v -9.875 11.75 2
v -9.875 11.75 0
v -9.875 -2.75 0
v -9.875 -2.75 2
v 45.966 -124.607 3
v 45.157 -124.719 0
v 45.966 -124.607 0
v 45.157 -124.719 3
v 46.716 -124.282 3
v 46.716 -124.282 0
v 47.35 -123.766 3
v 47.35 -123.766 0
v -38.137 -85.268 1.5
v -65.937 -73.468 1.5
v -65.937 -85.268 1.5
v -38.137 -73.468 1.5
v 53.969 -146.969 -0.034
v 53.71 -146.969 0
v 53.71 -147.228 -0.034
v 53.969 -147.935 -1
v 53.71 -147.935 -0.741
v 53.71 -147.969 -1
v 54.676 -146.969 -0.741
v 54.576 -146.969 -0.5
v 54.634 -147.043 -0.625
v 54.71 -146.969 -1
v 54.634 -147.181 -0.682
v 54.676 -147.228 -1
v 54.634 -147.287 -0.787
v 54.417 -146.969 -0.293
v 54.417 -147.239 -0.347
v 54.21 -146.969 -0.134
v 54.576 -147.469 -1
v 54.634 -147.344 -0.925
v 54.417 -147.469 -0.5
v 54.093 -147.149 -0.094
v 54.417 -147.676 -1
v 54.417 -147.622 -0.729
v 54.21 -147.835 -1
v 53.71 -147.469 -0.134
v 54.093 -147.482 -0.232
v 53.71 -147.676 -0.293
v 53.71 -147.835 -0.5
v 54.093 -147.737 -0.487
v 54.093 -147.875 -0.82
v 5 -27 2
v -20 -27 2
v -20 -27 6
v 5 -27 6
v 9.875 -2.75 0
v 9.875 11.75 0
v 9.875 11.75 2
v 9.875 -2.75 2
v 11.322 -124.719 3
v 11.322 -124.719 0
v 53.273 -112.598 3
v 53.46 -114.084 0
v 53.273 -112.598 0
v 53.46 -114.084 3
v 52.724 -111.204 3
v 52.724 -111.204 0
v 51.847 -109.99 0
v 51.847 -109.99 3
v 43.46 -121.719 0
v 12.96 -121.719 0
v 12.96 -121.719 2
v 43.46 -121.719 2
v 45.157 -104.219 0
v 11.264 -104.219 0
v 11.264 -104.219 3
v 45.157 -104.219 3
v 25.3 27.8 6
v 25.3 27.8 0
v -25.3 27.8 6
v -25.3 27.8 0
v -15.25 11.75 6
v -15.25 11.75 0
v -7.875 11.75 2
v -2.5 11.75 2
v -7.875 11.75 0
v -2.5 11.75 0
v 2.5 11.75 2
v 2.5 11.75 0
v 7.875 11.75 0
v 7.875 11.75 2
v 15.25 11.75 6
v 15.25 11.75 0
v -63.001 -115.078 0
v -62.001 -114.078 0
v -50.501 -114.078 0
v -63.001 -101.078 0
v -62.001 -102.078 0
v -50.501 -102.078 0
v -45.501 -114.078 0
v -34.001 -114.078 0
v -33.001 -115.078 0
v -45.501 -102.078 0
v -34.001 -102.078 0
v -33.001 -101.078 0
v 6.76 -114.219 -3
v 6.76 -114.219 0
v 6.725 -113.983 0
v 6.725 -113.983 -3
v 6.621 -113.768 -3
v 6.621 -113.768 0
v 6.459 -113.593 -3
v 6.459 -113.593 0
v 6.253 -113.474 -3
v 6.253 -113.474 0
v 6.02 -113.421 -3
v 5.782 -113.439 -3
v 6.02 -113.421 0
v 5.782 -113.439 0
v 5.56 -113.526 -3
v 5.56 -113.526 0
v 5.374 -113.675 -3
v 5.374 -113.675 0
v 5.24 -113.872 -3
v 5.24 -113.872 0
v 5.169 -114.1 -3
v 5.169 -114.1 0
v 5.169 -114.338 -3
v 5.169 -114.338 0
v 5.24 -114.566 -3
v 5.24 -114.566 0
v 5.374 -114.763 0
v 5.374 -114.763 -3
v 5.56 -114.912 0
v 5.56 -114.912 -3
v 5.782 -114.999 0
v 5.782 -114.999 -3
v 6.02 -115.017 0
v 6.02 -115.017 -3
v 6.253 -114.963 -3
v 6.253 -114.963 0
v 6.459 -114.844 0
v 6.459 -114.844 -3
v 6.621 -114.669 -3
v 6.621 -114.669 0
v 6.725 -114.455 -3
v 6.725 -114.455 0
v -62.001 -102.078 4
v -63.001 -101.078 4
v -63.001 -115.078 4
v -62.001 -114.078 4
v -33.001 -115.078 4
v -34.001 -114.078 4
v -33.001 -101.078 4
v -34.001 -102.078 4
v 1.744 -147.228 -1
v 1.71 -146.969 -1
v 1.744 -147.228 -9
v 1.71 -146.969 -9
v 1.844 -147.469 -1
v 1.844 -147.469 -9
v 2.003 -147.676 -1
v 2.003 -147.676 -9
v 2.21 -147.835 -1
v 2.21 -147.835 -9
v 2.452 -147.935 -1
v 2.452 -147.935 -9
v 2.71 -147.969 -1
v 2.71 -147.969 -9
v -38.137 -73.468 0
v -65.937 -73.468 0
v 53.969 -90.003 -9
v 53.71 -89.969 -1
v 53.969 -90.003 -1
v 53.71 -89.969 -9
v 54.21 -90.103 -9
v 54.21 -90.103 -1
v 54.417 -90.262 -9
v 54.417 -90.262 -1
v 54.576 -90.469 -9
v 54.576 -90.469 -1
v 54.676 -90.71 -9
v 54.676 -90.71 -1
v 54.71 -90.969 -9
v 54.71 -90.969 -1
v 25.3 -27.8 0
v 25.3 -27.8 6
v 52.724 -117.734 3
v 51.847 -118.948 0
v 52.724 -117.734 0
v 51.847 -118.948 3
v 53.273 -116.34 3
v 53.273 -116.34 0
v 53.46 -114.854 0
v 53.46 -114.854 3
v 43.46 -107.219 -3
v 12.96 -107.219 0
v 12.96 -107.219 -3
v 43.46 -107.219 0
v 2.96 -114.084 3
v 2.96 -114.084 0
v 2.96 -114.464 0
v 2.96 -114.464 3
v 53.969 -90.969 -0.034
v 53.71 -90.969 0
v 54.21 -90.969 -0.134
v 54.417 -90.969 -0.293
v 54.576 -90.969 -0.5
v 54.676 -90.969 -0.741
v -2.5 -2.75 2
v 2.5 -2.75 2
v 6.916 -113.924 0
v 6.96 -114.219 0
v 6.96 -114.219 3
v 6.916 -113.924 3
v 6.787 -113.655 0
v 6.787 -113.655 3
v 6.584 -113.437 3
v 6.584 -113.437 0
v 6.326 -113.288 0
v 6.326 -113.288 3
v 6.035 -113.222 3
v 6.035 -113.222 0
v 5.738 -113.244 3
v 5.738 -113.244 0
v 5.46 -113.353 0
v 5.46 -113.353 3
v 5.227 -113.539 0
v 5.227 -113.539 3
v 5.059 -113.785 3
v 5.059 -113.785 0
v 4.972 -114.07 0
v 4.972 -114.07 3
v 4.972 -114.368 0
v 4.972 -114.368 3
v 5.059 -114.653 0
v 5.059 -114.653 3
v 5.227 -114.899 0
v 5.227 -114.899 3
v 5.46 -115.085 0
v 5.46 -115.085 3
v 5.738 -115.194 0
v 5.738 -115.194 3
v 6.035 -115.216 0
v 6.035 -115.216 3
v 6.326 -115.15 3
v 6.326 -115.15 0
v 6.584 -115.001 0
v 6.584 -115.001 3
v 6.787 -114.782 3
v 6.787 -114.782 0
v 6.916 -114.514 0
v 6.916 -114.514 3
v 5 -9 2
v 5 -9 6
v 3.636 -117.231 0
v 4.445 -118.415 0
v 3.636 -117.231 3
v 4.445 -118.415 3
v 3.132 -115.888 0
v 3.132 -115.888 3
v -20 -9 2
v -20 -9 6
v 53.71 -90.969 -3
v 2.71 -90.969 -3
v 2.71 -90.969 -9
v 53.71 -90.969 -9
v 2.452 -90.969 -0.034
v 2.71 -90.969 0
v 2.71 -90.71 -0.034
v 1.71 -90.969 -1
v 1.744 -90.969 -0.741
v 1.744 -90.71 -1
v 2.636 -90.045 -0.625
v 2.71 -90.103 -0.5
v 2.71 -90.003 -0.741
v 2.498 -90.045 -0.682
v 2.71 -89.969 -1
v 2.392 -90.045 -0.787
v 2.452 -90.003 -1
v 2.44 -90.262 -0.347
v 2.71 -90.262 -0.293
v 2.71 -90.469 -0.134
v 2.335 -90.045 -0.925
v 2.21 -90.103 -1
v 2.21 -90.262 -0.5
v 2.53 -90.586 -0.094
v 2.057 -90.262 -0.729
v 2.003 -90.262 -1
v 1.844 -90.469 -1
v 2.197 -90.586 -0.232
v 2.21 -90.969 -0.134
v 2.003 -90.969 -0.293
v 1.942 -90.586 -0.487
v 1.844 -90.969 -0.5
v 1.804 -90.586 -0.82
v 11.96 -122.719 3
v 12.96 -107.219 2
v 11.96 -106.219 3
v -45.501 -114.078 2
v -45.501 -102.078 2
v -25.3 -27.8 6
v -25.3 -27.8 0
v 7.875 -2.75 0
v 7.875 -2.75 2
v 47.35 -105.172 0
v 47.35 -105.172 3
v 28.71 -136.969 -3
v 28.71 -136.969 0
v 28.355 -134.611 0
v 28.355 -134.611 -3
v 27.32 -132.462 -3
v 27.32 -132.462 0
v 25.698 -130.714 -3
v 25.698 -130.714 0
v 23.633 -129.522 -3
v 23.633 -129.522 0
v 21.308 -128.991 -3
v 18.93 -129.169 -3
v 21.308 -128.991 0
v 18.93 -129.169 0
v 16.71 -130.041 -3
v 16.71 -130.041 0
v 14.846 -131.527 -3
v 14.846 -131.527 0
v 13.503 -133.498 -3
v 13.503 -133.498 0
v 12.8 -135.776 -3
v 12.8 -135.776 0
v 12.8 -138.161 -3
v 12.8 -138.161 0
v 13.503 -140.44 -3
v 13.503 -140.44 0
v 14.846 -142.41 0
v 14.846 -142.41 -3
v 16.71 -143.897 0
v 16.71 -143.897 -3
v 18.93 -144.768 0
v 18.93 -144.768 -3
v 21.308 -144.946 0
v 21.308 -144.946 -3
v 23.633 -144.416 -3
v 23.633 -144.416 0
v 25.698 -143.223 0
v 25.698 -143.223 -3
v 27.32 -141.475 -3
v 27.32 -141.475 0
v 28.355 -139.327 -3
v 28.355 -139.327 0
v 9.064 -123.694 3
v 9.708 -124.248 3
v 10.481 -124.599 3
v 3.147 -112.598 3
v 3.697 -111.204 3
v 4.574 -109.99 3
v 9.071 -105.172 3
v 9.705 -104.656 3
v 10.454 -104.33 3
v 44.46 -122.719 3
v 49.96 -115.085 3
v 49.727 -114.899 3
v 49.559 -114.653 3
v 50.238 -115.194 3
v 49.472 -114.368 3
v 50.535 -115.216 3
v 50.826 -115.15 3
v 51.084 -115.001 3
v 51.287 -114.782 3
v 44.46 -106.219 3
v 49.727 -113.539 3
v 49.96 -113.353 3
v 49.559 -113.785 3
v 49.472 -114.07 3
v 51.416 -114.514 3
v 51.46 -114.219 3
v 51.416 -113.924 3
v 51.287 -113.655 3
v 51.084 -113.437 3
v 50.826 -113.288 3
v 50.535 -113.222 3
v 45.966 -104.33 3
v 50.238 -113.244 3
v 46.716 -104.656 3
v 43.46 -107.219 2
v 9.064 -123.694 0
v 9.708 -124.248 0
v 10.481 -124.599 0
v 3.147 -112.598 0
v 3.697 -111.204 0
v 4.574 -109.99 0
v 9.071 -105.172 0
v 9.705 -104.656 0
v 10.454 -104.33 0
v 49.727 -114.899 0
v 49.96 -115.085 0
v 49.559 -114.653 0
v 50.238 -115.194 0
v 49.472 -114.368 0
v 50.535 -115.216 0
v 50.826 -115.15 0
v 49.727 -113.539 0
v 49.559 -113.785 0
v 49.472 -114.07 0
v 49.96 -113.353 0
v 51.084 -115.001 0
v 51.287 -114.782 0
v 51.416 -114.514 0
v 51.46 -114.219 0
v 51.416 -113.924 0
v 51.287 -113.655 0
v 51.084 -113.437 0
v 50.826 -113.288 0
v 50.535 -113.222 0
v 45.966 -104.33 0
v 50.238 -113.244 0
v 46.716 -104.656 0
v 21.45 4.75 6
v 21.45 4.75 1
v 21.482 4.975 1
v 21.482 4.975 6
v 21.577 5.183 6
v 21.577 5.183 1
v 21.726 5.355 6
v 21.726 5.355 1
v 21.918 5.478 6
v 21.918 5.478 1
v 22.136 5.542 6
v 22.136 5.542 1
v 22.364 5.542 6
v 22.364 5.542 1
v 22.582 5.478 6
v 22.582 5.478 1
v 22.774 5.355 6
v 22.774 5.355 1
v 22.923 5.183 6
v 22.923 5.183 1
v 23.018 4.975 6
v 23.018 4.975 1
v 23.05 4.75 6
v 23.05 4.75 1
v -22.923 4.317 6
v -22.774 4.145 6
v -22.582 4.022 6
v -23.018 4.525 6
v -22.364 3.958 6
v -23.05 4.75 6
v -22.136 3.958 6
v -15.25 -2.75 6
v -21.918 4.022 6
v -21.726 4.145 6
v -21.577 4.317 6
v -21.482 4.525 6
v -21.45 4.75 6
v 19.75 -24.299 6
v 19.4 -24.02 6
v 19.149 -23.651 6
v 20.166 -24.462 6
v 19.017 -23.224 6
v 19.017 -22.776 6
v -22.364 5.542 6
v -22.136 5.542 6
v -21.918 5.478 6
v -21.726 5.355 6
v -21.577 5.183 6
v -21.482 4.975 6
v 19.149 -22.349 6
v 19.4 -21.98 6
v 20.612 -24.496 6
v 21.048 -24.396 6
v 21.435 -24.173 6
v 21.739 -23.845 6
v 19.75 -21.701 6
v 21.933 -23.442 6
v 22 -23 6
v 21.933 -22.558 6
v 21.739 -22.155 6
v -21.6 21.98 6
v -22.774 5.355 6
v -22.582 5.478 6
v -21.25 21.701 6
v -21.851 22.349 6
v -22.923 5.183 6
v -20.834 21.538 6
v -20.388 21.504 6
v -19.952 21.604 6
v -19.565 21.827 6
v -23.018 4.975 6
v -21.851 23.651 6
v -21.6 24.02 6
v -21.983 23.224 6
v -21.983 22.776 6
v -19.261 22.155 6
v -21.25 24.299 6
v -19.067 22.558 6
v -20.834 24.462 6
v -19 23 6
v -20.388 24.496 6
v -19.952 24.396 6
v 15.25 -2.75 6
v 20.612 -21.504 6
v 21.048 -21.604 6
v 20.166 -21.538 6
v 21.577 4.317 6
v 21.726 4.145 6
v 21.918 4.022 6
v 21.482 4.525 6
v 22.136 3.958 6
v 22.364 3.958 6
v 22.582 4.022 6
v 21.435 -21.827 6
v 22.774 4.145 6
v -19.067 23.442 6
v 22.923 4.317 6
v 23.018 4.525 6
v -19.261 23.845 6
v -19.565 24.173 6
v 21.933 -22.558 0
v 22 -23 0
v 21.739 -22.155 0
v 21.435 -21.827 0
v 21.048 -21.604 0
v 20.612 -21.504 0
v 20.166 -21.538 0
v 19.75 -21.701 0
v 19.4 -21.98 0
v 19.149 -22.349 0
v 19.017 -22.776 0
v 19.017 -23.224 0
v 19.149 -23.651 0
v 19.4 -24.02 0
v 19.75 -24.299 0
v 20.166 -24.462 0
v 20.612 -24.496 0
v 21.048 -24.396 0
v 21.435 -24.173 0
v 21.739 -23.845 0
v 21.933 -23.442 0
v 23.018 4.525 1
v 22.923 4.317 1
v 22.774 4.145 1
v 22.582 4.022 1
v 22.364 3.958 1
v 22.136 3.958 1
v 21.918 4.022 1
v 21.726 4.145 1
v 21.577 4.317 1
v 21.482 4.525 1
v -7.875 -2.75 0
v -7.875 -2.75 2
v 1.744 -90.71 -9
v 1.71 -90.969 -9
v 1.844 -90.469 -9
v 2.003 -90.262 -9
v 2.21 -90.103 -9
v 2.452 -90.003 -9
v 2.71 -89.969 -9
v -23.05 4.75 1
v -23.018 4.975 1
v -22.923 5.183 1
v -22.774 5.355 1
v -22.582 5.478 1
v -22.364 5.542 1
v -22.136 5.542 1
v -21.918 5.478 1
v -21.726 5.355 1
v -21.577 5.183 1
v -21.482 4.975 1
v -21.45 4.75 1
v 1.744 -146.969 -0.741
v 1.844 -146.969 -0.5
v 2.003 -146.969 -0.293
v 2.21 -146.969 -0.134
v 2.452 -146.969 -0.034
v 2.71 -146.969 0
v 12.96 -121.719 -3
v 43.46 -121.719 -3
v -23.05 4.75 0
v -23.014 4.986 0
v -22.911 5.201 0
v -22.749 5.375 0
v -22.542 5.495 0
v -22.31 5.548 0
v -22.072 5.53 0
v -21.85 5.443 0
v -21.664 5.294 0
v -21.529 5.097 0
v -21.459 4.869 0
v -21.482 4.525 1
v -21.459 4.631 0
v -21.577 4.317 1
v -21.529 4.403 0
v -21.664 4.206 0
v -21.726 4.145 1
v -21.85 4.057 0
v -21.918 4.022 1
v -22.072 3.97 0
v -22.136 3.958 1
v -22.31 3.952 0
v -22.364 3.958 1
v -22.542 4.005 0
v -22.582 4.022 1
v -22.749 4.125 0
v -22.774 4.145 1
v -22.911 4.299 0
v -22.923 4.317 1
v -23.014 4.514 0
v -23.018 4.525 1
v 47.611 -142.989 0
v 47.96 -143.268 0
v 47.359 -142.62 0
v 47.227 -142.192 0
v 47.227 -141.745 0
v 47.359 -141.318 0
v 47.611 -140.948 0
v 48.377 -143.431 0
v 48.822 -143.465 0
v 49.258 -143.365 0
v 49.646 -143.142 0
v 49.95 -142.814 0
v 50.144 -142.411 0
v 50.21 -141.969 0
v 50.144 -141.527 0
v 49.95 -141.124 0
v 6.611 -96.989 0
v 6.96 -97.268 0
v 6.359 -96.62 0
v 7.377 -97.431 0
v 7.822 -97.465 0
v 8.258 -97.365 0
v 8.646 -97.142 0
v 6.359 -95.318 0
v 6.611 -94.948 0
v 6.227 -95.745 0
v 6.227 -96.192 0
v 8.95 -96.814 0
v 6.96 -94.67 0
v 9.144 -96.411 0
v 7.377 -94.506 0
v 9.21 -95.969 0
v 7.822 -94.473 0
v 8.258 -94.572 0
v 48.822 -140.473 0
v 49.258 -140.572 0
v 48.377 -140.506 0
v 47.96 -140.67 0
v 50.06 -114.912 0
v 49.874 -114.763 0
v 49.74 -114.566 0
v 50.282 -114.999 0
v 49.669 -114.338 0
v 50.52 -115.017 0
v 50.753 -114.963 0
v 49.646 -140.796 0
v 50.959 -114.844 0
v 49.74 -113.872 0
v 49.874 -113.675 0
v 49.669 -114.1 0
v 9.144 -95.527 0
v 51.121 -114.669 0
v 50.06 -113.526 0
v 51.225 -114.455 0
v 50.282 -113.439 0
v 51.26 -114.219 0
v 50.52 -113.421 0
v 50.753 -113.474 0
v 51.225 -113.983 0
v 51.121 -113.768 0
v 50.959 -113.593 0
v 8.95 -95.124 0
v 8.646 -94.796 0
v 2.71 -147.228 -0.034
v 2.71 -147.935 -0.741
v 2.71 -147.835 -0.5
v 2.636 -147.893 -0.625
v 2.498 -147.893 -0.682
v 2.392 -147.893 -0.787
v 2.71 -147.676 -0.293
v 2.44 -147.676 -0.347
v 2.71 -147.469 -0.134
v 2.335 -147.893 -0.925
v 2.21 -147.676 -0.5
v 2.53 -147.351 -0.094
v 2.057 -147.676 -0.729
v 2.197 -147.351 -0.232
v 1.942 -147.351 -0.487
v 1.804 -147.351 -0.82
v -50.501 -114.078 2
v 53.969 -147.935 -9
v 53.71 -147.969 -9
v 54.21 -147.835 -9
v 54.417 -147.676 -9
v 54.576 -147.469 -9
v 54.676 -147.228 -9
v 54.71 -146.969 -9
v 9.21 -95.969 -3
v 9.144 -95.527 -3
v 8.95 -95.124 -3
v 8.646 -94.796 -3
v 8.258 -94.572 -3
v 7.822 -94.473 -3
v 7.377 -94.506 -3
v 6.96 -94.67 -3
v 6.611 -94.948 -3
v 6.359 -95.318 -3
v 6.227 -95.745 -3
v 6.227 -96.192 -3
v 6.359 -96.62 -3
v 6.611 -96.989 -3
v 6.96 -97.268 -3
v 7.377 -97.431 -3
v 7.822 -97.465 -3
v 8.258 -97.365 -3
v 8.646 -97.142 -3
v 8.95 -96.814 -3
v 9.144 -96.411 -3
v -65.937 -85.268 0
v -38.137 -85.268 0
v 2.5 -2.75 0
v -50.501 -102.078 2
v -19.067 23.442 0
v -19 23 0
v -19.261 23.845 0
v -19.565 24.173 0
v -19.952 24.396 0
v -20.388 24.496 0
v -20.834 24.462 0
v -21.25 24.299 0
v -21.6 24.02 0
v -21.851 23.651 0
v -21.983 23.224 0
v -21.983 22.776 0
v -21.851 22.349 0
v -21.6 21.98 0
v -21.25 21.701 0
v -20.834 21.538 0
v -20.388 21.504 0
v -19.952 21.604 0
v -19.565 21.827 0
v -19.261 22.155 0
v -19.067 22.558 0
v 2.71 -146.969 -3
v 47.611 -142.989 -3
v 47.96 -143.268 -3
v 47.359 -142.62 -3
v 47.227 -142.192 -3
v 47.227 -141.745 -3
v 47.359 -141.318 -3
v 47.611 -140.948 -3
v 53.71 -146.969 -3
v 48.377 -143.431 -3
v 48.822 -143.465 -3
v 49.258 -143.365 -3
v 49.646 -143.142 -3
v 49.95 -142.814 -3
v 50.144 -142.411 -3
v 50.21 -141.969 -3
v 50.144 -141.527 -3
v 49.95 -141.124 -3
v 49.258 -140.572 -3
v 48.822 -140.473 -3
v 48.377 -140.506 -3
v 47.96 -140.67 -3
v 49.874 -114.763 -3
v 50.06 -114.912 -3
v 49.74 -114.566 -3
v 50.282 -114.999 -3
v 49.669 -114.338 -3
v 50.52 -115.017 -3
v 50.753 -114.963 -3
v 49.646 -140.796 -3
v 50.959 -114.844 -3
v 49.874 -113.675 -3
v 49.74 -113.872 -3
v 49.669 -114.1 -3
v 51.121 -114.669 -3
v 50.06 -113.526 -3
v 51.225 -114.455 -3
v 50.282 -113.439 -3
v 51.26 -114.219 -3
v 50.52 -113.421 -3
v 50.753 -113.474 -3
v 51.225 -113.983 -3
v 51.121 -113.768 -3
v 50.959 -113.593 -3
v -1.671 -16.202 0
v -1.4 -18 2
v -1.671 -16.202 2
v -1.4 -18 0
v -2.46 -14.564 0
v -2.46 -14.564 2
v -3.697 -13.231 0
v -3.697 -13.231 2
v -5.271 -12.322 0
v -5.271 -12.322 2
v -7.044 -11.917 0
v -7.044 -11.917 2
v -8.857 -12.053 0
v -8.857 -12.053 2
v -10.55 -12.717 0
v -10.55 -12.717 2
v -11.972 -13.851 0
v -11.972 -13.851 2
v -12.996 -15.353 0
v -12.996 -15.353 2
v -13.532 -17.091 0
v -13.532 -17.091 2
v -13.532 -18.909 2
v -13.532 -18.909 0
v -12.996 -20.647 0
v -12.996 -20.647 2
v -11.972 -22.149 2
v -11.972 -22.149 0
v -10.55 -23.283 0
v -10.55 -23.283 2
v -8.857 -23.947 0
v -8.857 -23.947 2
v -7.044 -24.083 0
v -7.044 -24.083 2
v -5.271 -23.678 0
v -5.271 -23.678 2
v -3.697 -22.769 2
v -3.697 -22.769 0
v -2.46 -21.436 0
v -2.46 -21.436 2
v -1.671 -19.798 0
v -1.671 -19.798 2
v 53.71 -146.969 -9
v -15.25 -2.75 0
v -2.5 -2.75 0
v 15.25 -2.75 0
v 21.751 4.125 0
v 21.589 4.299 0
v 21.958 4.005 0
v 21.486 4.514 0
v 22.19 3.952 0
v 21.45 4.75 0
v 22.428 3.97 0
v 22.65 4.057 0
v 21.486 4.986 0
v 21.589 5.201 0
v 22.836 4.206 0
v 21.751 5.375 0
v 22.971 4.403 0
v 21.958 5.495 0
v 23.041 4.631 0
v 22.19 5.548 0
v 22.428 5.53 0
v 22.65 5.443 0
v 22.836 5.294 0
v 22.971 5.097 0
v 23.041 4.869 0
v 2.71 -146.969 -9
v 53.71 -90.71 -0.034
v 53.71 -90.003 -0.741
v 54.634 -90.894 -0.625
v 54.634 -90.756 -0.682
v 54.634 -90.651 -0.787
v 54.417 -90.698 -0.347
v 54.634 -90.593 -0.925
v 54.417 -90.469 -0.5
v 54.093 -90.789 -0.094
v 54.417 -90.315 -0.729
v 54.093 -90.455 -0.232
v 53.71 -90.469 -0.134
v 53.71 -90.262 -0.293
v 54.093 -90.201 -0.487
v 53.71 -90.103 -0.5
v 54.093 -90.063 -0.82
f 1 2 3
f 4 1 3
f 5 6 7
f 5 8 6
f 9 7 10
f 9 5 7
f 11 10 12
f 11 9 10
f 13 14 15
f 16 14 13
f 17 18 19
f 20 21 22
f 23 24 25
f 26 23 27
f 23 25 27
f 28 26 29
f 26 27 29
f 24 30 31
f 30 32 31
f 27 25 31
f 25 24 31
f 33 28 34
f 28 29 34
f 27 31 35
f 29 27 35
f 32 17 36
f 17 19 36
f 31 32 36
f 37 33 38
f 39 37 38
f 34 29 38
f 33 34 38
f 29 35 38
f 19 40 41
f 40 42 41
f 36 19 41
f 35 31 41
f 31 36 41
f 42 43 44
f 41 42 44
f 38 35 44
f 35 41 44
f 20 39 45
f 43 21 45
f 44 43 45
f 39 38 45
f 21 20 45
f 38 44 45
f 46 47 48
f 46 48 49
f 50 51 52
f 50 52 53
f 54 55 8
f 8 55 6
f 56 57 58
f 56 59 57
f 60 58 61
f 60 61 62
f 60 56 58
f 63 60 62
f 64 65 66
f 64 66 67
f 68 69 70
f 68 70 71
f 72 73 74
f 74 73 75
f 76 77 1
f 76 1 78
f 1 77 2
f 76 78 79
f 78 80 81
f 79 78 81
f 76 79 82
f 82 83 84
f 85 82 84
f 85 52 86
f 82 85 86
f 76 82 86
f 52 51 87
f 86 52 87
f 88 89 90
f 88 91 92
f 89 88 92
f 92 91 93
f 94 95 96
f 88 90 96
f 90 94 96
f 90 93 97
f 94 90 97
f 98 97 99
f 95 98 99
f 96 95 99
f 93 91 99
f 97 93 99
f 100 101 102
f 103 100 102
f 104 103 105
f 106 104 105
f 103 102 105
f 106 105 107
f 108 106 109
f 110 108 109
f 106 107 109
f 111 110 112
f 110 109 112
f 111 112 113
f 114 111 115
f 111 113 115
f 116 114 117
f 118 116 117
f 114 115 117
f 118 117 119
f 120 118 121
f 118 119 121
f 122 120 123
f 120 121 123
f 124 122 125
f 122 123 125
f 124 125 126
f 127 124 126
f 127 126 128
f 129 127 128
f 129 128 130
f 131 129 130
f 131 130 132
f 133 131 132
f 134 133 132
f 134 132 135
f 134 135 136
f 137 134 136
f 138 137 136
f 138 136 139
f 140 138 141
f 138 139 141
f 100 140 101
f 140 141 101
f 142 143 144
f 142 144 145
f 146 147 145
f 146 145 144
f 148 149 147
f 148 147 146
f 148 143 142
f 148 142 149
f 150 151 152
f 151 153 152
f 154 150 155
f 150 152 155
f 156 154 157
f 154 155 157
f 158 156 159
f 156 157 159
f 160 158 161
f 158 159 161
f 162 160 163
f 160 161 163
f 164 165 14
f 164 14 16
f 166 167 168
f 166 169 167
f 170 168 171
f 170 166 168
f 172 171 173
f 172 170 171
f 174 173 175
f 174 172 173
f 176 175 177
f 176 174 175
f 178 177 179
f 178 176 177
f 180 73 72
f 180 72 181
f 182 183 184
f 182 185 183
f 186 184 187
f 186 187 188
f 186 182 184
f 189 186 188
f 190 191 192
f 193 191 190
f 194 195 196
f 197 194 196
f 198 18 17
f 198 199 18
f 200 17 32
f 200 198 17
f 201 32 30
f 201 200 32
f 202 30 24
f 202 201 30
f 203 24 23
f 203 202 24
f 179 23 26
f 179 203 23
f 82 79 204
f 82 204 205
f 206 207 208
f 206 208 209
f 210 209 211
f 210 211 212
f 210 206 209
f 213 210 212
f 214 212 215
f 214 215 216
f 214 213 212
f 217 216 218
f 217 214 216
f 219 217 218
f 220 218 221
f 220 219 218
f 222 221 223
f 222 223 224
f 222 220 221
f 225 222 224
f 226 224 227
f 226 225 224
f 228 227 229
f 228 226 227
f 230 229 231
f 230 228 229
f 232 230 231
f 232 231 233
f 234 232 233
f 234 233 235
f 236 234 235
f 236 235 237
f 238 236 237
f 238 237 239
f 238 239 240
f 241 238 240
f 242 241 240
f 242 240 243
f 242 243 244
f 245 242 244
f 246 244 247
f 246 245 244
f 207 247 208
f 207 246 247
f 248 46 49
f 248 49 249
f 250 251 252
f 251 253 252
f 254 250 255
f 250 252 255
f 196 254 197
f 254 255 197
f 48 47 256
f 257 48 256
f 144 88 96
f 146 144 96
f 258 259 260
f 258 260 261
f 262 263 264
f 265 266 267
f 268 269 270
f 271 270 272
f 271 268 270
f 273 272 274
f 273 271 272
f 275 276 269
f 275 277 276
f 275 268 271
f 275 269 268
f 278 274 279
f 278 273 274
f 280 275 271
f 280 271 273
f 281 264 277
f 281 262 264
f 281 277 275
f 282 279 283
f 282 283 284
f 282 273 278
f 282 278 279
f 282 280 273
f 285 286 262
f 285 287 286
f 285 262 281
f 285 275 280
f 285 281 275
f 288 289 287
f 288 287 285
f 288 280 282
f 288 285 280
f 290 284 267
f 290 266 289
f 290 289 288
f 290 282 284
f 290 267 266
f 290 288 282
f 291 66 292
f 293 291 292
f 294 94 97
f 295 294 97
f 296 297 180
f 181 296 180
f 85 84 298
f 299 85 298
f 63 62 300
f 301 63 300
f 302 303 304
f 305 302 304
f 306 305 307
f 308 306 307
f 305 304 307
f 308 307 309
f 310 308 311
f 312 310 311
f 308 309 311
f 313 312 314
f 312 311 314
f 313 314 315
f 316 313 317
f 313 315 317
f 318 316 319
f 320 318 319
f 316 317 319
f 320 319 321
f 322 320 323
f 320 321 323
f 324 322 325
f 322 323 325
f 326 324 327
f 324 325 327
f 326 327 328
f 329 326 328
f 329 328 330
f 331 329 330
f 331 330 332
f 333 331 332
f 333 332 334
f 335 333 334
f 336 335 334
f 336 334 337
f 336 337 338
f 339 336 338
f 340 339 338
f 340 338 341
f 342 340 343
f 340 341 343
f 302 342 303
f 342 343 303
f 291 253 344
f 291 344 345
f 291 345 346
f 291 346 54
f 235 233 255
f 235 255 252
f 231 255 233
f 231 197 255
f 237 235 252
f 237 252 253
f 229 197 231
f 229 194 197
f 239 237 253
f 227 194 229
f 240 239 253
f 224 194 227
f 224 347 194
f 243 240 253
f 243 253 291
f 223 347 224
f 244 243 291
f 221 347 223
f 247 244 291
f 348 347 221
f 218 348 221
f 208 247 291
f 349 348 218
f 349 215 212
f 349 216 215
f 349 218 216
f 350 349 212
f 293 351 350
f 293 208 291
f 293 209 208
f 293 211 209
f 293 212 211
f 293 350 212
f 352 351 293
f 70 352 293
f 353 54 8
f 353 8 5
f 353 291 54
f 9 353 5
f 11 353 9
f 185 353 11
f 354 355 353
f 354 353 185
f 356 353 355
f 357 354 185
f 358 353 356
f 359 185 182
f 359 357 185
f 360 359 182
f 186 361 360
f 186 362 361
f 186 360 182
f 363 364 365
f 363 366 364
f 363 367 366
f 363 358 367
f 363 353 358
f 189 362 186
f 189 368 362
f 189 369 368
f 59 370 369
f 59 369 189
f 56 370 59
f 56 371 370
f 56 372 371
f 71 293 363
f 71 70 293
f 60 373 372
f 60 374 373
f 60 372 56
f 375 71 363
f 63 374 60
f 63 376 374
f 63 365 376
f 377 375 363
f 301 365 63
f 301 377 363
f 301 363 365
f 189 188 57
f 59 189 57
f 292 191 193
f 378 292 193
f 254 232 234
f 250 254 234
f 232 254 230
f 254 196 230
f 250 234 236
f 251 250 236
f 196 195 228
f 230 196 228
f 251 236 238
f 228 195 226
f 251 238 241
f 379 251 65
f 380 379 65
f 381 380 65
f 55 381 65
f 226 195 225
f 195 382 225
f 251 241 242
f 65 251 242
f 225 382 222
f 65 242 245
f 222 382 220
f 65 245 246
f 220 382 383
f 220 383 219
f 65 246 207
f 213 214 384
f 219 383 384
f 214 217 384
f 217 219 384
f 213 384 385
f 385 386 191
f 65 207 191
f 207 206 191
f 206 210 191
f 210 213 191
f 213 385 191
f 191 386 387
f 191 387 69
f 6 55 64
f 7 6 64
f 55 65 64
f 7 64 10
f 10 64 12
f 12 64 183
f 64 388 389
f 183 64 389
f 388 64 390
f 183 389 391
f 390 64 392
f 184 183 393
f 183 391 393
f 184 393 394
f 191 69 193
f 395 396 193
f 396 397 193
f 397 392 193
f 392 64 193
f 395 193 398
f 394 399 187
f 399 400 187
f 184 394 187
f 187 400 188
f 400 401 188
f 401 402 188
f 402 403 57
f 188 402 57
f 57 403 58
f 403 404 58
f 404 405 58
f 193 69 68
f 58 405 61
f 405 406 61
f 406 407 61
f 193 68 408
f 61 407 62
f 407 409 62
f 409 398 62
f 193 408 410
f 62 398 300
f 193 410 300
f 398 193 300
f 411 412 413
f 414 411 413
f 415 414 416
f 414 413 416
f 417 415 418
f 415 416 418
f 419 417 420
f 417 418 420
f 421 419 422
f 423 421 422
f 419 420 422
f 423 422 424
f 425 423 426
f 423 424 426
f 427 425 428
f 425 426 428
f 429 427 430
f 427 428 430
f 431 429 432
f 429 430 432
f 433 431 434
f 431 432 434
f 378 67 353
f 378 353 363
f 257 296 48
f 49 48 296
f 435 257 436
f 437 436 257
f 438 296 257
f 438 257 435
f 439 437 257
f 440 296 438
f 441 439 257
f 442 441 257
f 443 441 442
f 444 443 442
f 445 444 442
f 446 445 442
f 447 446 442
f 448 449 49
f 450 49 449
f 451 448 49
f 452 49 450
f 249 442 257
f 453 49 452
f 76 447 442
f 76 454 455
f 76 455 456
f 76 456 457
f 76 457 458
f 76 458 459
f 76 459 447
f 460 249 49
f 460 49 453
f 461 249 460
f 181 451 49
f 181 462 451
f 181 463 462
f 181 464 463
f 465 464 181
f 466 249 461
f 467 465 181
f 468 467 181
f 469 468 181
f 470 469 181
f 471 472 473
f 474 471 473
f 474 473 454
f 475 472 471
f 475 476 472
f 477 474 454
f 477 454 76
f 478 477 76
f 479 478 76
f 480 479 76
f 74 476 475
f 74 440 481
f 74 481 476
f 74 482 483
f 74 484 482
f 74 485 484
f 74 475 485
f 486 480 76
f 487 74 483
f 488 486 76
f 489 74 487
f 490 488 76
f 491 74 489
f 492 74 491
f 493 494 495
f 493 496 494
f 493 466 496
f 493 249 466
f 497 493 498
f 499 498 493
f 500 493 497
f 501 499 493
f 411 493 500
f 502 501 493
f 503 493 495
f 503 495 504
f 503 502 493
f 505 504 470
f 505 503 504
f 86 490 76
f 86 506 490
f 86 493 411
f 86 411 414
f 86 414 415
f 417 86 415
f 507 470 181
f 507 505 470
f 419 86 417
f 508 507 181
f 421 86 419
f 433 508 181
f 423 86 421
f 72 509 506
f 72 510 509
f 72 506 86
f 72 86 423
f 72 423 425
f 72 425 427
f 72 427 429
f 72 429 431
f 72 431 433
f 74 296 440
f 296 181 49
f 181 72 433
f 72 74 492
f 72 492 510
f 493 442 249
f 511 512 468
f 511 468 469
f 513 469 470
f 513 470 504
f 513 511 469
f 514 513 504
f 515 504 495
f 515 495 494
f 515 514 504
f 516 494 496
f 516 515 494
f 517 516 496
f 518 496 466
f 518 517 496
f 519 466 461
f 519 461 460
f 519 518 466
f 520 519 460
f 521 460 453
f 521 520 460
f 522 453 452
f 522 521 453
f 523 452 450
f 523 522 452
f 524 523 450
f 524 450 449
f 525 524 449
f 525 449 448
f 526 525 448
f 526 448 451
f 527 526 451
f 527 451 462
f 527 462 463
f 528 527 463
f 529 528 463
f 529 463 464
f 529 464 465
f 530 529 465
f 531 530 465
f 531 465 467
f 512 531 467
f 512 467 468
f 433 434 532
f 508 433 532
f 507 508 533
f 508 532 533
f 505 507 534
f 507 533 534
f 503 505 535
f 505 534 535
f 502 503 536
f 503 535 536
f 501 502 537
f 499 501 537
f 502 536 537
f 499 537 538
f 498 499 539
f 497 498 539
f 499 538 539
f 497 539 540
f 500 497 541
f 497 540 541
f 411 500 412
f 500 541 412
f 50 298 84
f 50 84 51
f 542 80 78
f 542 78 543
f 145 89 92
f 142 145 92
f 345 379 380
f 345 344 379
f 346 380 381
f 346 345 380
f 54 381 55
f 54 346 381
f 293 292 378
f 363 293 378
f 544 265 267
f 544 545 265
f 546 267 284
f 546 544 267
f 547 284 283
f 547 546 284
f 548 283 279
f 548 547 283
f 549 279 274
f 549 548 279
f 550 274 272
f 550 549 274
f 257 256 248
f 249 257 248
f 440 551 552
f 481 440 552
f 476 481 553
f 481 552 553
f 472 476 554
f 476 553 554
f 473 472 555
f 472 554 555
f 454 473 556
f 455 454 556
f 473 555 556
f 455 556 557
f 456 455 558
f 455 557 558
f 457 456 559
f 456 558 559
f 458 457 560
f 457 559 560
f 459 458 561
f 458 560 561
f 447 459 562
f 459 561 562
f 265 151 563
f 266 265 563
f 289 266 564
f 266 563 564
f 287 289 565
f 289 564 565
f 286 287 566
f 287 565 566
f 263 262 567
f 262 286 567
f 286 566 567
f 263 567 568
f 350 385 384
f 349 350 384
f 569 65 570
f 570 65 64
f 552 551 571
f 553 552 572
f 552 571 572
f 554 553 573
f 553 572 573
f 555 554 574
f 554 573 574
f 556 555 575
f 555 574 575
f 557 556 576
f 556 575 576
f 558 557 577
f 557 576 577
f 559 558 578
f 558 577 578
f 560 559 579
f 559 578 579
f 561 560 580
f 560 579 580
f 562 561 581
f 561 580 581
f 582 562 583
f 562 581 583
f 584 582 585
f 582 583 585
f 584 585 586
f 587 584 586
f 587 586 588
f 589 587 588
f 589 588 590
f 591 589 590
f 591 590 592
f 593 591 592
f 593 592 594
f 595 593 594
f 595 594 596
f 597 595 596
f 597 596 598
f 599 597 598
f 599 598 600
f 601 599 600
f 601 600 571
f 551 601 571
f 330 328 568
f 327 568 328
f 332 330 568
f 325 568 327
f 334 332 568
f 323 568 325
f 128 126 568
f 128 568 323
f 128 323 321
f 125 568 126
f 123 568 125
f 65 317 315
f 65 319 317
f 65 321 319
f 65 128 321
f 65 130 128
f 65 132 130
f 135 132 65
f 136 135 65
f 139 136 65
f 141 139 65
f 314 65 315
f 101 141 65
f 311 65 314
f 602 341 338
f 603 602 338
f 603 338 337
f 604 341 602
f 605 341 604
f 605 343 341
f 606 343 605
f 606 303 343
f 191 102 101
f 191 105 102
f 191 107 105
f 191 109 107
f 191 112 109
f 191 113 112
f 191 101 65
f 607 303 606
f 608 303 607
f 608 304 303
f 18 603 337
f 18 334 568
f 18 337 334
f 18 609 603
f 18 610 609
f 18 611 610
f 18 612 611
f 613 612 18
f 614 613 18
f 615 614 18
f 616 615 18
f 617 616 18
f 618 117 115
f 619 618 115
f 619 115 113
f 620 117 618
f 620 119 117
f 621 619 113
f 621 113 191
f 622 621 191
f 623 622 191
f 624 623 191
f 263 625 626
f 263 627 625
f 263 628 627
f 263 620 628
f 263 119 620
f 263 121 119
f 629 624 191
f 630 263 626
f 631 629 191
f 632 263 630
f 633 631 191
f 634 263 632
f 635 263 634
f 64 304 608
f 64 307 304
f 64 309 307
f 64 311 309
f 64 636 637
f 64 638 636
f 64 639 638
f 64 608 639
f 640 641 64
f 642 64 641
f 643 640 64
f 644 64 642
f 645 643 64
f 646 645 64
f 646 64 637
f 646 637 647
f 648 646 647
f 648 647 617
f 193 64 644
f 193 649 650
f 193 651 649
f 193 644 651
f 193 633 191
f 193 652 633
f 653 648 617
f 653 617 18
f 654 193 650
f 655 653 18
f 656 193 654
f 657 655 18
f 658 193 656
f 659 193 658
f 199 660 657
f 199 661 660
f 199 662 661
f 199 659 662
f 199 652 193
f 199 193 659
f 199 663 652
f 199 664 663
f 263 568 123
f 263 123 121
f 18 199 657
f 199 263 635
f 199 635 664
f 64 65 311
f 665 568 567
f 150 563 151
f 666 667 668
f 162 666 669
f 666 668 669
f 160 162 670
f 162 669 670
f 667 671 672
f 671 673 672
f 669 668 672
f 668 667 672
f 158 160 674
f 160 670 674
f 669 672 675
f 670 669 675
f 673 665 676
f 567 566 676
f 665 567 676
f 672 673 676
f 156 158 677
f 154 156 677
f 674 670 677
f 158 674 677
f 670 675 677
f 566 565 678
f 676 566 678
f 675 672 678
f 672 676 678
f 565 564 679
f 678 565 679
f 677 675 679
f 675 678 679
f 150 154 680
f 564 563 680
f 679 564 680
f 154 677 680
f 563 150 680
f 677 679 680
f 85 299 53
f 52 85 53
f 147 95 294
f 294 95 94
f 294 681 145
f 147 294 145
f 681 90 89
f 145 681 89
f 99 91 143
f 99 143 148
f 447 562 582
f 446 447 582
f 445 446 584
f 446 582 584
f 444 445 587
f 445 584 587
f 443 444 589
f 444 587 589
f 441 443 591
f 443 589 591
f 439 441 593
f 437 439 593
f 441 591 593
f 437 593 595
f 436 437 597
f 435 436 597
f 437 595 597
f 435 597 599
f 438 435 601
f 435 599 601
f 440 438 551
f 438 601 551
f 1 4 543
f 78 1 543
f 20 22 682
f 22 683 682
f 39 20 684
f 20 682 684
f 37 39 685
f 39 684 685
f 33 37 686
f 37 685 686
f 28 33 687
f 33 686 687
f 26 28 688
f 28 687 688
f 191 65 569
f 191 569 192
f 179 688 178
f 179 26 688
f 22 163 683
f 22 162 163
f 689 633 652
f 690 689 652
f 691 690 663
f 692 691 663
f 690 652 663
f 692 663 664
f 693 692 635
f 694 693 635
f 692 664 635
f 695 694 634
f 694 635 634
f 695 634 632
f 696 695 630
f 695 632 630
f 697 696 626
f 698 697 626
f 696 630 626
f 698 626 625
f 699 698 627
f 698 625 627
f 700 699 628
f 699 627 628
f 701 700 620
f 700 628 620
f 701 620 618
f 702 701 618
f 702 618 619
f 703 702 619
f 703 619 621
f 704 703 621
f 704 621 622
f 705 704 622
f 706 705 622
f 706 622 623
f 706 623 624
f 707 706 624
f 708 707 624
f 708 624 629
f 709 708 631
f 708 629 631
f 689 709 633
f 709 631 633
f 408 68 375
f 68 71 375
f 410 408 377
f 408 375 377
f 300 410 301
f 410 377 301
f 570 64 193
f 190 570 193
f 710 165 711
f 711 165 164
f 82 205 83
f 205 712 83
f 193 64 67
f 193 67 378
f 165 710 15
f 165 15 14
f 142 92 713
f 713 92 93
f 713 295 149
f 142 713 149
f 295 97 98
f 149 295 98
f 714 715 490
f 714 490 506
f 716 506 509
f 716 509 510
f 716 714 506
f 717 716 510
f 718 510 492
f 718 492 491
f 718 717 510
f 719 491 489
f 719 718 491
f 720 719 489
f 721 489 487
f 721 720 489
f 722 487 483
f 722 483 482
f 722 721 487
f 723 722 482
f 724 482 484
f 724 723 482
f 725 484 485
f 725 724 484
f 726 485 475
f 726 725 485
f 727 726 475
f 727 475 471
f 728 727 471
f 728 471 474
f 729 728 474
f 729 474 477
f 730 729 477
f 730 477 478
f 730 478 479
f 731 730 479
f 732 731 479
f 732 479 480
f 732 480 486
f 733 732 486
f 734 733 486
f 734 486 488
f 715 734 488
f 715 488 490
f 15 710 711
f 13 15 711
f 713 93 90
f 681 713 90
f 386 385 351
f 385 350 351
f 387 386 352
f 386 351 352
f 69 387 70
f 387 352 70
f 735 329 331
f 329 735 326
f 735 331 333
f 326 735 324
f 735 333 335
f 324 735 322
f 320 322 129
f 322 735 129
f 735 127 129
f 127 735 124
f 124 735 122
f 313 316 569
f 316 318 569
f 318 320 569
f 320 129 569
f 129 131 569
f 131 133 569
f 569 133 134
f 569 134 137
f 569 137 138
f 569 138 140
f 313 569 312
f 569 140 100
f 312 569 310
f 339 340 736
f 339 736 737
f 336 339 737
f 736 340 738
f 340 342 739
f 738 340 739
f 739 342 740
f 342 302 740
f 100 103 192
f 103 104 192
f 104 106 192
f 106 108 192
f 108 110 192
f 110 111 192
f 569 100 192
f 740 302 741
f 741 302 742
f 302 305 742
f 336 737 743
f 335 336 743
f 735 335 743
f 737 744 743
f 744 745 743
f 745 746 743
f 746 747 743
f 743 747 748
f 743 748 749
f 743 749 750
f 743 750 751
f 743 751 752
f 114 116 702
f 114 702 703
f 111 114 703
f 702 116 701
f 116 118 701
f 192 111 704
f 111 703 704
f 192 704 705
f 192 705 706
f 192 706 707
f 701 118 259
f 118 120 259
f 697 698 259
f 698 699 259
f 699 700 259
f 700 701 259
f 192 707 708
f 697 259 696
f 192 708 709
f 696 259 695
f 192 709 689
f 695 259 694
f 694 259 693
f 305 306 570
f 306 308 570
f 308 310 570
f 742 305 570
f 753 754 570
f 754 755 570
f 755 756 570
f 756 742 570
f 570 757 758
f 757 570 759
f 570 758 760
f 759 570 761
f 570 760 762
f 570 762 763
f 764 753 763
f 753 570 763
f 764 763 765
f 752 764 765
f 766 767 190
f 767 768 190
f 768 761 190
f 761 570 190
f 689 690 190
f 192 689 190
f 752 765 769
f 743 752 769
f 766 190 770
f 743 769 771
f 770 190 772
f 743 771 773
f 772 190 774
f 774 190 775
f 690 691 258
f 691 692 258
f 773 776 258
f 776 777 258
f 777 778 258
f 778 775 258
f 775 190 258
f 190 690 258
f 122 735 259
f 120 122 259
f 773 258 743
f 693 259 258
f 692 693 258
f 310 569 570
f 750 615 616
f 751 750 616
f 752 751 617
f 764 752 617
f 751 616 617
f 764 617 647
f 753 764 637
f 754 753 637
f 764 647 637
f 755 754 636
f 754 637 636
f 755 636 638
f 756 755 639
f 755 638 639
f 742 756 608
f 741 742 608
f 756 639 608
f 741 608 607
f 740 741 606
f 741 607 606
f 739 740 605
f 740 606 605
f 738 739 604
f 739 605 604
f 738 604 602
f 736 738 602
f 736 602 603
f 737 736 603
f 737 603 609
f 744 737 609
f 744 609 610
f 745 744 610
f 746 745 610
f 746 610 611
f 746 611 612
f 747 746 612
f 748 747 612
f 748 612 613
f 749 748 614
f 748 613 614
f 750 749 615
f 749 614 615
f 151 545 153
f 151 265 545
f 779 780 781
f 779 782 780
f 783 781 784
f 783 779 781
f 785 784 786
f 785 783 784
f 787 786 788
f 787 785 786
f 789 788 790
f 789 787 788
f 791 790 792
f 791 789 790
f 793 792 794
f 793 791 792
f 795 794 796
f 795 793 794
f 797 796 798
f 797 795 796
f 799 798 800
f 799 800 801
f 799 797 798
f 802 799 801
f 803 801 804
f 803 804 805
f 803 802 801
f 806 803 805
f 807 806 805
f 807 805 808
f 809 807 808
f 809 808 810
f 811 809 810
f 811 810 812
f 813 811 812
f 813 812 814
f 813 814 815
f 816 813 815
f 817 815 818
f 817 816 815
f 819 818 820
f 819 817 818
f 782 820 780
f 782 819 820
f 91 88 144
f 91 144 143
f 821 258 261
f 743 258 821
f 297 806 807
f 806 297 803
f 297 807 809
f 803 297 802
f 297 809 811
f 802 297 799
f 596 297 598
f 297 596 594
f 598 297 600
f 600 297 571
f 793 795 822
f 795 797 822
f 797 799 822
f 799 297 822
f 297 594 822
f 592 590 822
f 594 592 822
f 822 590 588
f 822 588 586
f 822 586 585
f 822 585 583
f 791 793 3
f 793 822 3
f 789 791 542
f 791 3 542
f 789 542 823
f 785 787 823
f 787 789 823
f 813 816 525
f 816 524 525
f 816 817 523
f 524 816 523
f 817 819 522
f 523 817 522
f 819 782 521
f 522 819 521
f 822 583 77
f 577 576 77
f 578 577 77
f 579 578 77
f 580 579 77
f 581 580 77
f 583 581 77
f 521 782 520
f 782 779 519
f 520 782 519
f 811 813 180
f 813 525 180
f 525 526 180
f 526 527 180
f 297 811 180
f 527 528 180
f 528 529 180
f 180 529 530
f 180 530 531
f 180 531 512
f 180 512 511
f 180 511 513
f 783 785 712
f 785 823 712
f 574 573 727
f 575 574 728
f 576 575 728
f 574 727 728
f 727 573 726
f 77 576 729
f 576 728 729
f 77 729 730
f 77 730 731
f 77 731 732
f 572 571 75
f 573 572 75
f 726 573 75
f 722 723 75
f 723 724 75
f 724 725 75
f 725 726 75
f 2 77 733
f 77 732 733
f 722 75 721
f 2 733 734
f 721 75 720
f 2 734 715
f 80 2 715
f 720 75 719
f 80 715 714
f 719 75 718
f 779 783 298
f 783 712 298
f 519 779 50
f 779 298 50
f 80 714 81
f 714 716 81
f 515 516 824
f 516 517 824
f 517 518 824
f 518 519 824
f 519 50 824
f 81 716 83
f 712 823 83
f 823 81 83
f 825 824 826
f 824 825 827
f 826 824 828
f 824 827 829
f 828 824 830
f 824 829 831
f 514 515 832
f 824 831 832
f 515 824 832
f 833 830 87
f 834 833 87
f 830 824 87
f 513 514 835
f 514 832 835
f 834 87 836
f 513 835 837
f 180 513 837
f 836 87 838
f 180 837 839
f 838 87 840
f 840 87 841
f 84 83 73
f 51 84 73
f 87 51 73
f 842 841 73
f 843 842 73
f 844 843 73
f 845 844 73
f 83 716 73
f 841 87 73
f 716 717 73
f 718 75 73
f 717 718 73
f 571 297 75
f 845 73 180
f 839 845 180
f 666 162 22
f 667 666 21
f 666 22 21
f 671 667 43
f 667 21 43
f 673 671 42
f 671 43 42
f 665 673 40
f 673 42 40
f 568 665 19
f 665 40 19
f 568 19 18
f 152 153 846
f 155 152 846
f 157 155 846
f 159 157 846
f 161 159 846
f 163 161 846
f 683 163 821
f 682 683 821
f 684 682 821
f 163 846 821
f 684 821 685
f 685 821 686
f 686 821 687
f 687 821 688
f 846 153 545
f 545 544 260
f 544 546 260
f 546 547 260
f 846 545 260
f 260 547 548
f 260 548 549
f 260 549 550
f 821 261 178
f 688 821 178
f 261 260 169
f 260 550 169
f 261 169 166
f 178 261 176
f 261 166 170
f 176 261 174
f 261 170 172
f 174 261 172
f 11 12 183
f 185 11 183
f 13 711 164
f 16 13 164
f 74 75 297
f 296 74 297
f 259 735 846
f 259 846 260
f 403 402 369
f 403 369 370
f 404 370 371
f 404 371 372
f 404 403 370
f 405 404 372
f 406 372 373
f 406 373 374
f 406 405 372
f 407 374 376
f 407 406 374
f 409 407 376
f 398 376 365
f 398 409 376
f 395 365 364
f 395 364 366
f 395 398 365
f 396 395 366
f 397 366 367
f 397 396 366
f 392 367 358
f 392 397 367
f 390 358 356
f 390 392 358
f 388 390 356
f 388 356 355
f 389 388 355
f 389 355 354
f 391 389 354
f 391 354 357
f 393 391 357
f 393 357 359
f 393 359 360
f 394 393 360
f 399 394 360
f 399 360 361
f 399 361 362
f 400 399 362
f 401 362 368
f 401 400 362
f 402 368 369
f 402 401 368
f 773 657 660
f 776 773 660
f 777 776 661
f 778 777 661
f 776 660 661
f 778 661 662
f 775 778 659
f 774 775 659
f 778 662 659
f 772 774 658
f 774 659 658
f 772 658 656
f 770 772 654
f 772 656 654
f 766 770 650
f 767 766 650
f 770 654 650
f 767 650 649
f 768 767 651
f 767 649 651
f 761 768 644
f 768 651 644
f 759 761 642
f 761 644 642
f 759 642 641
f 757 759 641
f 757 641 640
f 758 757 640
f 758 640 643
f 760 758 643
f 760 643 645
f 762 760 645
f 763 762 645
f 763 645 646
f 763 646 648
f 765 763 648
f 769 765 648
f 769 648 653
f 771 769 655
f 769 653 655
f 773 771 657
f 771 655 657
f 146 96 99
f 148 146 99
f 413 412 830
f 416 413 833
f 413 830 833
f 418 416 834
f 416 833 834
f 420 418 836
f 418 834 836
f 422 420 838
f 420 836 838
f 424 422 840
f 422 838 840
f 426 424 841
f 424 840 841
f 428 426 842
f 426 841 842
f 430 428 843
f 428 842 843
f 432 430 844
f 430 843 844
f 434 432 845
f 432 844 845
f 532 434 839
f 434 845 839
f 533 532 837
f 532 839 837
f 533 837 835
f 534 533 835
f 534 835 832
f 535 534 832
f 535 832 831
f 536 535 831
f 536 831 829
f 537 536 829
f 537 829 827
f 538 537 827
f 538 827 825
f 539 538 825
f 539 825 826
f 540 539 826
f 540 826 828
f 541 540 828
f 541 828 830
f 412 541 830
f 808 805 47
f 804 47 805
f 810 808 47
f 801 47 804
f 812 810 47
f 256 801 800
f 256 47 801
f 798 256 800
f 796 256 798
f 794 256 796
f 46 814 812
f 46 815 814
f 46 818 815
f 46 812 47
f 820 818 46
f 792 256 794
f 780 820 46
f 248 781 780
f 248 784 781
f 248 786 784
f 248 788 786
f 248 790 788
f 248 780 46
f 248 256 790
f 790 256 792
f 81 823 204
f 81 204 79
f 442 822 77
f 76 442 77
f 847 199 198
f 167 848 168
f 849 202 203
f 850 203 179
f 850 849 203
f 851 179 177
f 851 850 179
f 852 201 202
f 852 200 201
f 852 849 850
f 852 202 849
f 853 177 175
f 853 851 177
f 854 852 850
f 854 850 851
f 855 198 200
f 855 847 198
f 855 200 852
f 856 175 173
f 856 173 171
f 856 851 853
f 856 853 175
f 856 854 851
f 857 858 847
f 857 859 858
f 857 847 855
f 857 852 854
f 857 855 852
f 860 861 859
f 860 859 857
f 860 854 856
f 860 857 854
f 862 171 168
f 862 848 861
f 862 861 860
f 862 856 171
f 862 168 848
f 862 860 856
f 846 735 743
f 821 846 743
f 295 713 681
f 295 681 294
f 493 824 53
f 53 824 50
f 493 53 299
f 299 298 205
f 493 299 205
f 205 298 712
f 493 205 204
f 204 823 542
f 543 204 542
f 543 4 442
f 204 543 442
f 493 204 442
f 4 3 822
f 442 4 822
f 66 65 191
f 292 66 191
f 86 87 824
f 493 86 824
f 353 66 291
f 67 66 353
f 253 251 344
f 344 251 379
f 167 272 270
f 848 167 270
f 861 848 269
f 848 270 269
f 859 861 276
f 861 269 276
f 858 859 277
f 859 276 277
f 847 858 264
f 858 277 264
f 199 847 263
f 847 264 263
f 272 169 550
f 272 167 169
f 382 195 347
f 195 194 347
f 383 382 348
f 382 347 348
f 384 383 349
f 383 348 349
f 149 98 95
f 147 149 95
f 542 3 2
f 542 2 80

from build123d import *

# Parameters (mm, degrees)
F0_W      = 51
F0_H      = 56
F0_R      = 6.1
F0_R_2    = 1.5
F0_W_2    = 5
F0_H_2    = 14.5
F1_DEPTH  = 1
F2_W      = 30
F2_H      = 14
F5_DEPTH  = 4
F2_W_2    = 51
F2_H_2    = 56
F2_R      = 8
F2_R_2    = 1.5
F2_R_3    = 0.8
F2_W_3    = 30.5
F2_H_3    = 14.5
F6_DEPTH  = 3
F2_W_4    = 5
F2_H_4    = 2
F2_H_5    = 5
F7_DEPTH  = 2
F3_W      = 27.8
F3_H      = 11.8
F8_DEPTH  = 1.5
F2_H_6    = 1
F9_DEPTH  = 9
F10_W     = 36.5
F10_H     = 20.5
F10_W_2   = 30.5
F10_H_2   = 14.5
F10_R     = 1
F11_DEPTH = 3
F12_R     = 6
F13_R     = 3
F14_R     = 1
F15_SIZE  = 1
F18_DEPTH = 1
F19_D     = 1.4
F19_DEPTH = 1.001
F21_D     = 1.4
F16_W     = 51
F16_H     = 56
F16_W_2   = 25
F16_H_2   = 18
F16_R     = 1.5
F22_DEPTH = 5
F23_W     = 0.2
F23_H     = 55.6
F24_DEPTH = 25
F25_D     = 1.6
F25_DEPTH = 5.001
F26_D     = 1.6
F27_W     = 2
F27_H     = 14.5
F28_DEPTH = 2


# Not quite as in the source:
# - a feature names something its author has since deleted; it is built from what else it names


with BuildPart() as f1:
    # F0 (on Top) → F1 (new body)
    with BuildSketch(Plane.XY):
        Rectangle(F0_W, F0_H)
        with Locations((-7.5, -18)):
            Circle(F0_R, mode=Mode.SUBTRACT)
        with Locations((20.5, -23)):
            Circle(F0_R_2, mode=Mode.SUBTRACT)
        with Locations((-20.5, 23)):
            Circle(F0_R_2, mode=Mode.SUBTRACT)
        Polygon((-15.25, -2.75), (-15.25, 11.75), (-2.5, 11.75), (2.5, 11.75), (15.25, 11.75), (15.25, -2.75), (2.5, -2.75), (-2.5, -2.75), align=None, mode=Mode.SUBTRACT)
        with Locations((0, 4.5)):
            Rectangle(F0_W_2, F0_H_2)
    extrude(amount=F1_DEPTH)

    # F18 (add): a face of the model
    f18_faces = [f1.faces().sort_by_distance(p)[0] for p in [
        (0.3722548806, 0.1869472989, 1),
    ]]
    extrude(f18_faces, amount=F18_DEPTH)

    # F19 (through all, one way)
    with BuildSketch(Plane.XY.offset(1)):
        with Locations((-22.25, 4.75), (22.25, 4.75)):
            Circle(F19_D / 2)
    extrude(amount=-F19_DEPTH, mode=Mode.SUBTRACT)

    # F21 (through all)
    with Locations(Plane(origin=(0, 0, 1), x_dir=(1, 0, 0), z_dir=(0, 0, -1))):
        with Locations((-22.25, -4.75), (22.25, -4.75)):
            Hole(F21_D / 2)

    # F16 (on face) → F22 (join)
    with BuildSketch(Plane.XY.offset(1)):
        Rectangle(F16_W, F16_H)
        with Locations((-7.5, -18)):
            Rectangle(F16_W_2, F16_H_2, mode=Mode.SUBTRACT)
        with Locations((20.5, -23)):
            Circle(F16_R, mode=Mode.SUBTRACT)
        with Locations((-20.5, 23)):
            Circle(F16_R, mode=Mode.SUBTRACT)
        Polygon((-15.25, -2.75), (-15.25, 11.75), (-2.5, 11.75), (2.5, 11.75), (15.25, 11.75), (15.25, -2.75), (2.5, -2.75), (-2.5, -2.75), align=None, mode=Mode.SUBTRACT)
    extrude(amount=F22_DEPTH)

    # F23 (on face) → F24 (cut)
    with BuildSketch(Plane(origin=(0, 0, 0), x_dir=(1, 0, 0), z_dir=(0, 0, -1))):
        Polygon((25.5, 28), (-25.5, 28), (-25.5, 27.8), (-25.3, 27.8), (25.3, 27.8), (25.5, 27.8), align=None)
        with Locations((-25.4, 0)):
            Rectangle(F23_W, F23_H)
        with Locations((25.4, 0)):
            Rectangle(F23_W, F23_H)
        Polygon((-25.3, -27.8), (-25.5, -27.8), (-25.5, -28), (25.5, -28), (25.5, -27.8), (25.3, -27.8), align=None)
    extrude(amount=-F24_DEPTH, mode=Mode.SUBTRACT)

    # F25 (through all, one way)
    with BuildSketch(Plane(origin=(0, 0, 1), x_dir=(1, 0, 0), z_dir=(0, 0, -1))):
        with Locations((-22.25, -4.75), (22.25, -4.75)):
            Circle(F25_D / 2)
    extrude(amount=-F25_DEPTH, mode=Mode.SUBTRACT)

    # F26 (through all)
    with Locations(Plane.XY.offset(1)):
        with Locations((22.25, 4.75), (-22.25, 4.75)):
            Hole(F26_D / 2)

    # F27 (on face) → F28 (join)
    with BuildSketch(Plane(origin=(0, 0, 0), x_dir=(1, 0, 0), z_dir=(0, 0, -1))):
        with Locations((-8.875, -4.5)):
            Rectangle(F27_W, F27_H)
        with Locations((8.875, -4.5)):
            Rectangle(F27_W, F27_H)
    extrude(amount=-F28_DEPTH)


with BuildPart() as f5:
    # F2 (on Top) → F5 (new body)
    with BuildSketch(Plane.XY):
        with Locations((-48.0005137329, -108.0776734079)):
            Rectangle(F2_W, F2_H)
        Polygon((-62.0005137329, -114.0776734079), (-62.0005137329, -102.0776734079), (-50.5005137329, -102.0776734079), (-45.5005137329, -102.0776734079), (-34.0005137329, -102.0776734079), (-34.0005137329, -107.0776734079), (-34.0005137329, -109.0776734079), (-34.0005137329, -114.0776734079), (-45.5005137329, -114.0776734079), (-50.5005137329, -114.0776734079), align=None, mode=Mode.SUBTRACT)
    extrude(amount=F5_DEPTH)

    # F2 (on Top) → F7 (join)
    with BuildSketch(Plane.XY):
        with Locations((-48.0005137329, -108.0776734079)):
            Rectangle(F2_W_4, F2_H_4)
        with Locations((-48.0005137329, -104.5776734079)):
            Rectangle(F2_W_4, F2_H_5)
        with Locations((-48.0005137329, -111.5776734079)):
            Rectangle(F2_W_4, F2_H_5)
    extrude(amount=F7_DEPTH)


with BuildPart() as f6:
    # F2 (on Top) → F6 (new body)
    with BuildSketch(Plane.XY):
        with Locations((28.2103444552, -118.9687541723)):
            Rectangle(F2_W_2, F2_H_2)
        with Locations((20.7103444552, -136.9687541723)):
            Circle(F2_R, mode=Mode.SUBTRACT)
        with Locations((48.7103444552, -141.9687541723)):
            Circle(F2_R_2, mode=Mode.SUBTRACT)
        with Locations((5.9603444552, -114.2187541723)):
            Circle(F2_R_3, mode=Mode.SUBTRACT)
        with Locations((28.2103444552, -114.4687541723)):
            Rectangle(F2_W_3, F2_H_3, mode=Mode.SUBTRACT)
        with Locations((50.4603444552, -114.2187541723)):
            Circle(F2_R_3, mode=Mode.SUBTRACT)
        with Locations((7.7103444552, -95.9687541723)):
            Circle(F2_R_2, mode=Mode.SUBTRACT)
    extrude(amount=-F6_DEPTH)

    # F2 (on Top) → F9 (join)
    with BuildSketch(Plane.XY):
        Polygon((2.7103444552, -146.9687541723), (2.7103444552, -90.9687541723), (2.7103444552, -89.9687541723), (1.7103444552, -89.9687541723), (1.7103444552, -147.9687541723), (2.7103444552, -147.9687541723), align=None)
        with Locations((28.2103444552, -90.4687541723)):
            Rectangle(F2_W_2, F2_H_6)
        with Locations((28.2103444552, -147.4687541723)):
            Rectangle(F2_W_2, F2_H_6)
        Polygon((53.7103444552, -89.9687541723), (53.7103444552, -90.9687541723), (53.7103444552, -146.9687541723), (53.7103444552, -147.9687541723), (54.7103444552, -147.9687541723), (54.7103444552, -89.9687541723), align=None)
    extrude(amount=-F9_DEPTH)

    # F14
    f14_edges = [f6.edges().sort_by_distance(p)[0] for p in [
        (1.710344, -118.968754, 0),
        (28.210344, -89.968754, 0),
        (28.210344, -147.968754, 0),
        (54.710344, -118.968754, 0),
        (54.710344, -147.968754, -4.5),
        (1.710344, -147.968754, -4.5),
        (1.710344, -89.968754, -4.5),
        (54.710344, -89.968754, -4.5),
    ]]
    fillet(f14_edges, radius=F14_R)


with BuildPart() as f8:
    # F3 (on Top) → F8 (new body)
    with BuildSketch(Plane.XY):
        with Locations((-52.0366017878, -79.3675661445)):
            Rectangle(F3_W, F3_H)
    extrude(amount=F8_DEPTH)


with BuildPart() as f11:
    # F10 (on face) → F11 (new body)
    with BuildSketch(Plane.XY):
        with Locations((28.2103444552, -114.4687541723)):
            Rectangle(F10_W, F10_H)
        with Locations((28.2103444552, -114.4687541723)):
            Rectangle(F10_W_2, F10_H_2, mode=Mode.SUBTRACT)
        Polygon((9.9603444552, -124.7187541723), (9.9603444552, -104.2187541723), (2.9603444552, -111.7187541723), (2.9603444552, -116.7187541723), align=None)
        with Locations((5.9603444552, -114.2187541723)):
            Circle(F10_R, mode=Mode.SUBTRACT)
        Polygon((53.4603444552, -111.7187541723), (46.4603444552, -104.2187541723), (46.4603444552, -124.7187541723), (53.4603444552, -117.2187541723), align=None)
        with Locations((50.4603444552, -114.2187541723)):
            Circle(F10_R, mode=Mode.SUBTRACT)
    extrude(amount=F11_DEPTH)

    # F12
    f12_edges = [f11.edges().sort_by_distance(p)[0] for p in [
        (2.960344, -111.718754, 1.5),
        (2.960344, -116.718754, 1.5),
        (53.460344, -117.218754, 1.5),
        (53.460344, -111.718754, 1.5),
    ]]
    fillet(f12_edges, radius=F12_R)

    # F13
    f13_edges = [f11.edges().sort_by_distance(p)[0] for p in [
        (9.960344, -104.218754, 1.5),
        (9.960344, -124.718754, 1.5),
        (46.460344, -124.718754, 1.5),
        (46.460344, -104.218754, 1.5),
    ]]
    fillet(f13_edges, radius=F13_R)

    # F15
    f15_edges = [f11.edges().sort_by_distance(p)[0] for p in [
        (12.960344, -114.468754, 3),
        (28.210344, -107.218754, 3),
        (43.460344, -114.468754, 3),
        (28.210344, -121.718754, 3),
    ]]
    chamfer(f15_edges, length=F15_SIZE)


solid = Compound([f1.part, f5.part, f6.part, f8.part, f11.part])
